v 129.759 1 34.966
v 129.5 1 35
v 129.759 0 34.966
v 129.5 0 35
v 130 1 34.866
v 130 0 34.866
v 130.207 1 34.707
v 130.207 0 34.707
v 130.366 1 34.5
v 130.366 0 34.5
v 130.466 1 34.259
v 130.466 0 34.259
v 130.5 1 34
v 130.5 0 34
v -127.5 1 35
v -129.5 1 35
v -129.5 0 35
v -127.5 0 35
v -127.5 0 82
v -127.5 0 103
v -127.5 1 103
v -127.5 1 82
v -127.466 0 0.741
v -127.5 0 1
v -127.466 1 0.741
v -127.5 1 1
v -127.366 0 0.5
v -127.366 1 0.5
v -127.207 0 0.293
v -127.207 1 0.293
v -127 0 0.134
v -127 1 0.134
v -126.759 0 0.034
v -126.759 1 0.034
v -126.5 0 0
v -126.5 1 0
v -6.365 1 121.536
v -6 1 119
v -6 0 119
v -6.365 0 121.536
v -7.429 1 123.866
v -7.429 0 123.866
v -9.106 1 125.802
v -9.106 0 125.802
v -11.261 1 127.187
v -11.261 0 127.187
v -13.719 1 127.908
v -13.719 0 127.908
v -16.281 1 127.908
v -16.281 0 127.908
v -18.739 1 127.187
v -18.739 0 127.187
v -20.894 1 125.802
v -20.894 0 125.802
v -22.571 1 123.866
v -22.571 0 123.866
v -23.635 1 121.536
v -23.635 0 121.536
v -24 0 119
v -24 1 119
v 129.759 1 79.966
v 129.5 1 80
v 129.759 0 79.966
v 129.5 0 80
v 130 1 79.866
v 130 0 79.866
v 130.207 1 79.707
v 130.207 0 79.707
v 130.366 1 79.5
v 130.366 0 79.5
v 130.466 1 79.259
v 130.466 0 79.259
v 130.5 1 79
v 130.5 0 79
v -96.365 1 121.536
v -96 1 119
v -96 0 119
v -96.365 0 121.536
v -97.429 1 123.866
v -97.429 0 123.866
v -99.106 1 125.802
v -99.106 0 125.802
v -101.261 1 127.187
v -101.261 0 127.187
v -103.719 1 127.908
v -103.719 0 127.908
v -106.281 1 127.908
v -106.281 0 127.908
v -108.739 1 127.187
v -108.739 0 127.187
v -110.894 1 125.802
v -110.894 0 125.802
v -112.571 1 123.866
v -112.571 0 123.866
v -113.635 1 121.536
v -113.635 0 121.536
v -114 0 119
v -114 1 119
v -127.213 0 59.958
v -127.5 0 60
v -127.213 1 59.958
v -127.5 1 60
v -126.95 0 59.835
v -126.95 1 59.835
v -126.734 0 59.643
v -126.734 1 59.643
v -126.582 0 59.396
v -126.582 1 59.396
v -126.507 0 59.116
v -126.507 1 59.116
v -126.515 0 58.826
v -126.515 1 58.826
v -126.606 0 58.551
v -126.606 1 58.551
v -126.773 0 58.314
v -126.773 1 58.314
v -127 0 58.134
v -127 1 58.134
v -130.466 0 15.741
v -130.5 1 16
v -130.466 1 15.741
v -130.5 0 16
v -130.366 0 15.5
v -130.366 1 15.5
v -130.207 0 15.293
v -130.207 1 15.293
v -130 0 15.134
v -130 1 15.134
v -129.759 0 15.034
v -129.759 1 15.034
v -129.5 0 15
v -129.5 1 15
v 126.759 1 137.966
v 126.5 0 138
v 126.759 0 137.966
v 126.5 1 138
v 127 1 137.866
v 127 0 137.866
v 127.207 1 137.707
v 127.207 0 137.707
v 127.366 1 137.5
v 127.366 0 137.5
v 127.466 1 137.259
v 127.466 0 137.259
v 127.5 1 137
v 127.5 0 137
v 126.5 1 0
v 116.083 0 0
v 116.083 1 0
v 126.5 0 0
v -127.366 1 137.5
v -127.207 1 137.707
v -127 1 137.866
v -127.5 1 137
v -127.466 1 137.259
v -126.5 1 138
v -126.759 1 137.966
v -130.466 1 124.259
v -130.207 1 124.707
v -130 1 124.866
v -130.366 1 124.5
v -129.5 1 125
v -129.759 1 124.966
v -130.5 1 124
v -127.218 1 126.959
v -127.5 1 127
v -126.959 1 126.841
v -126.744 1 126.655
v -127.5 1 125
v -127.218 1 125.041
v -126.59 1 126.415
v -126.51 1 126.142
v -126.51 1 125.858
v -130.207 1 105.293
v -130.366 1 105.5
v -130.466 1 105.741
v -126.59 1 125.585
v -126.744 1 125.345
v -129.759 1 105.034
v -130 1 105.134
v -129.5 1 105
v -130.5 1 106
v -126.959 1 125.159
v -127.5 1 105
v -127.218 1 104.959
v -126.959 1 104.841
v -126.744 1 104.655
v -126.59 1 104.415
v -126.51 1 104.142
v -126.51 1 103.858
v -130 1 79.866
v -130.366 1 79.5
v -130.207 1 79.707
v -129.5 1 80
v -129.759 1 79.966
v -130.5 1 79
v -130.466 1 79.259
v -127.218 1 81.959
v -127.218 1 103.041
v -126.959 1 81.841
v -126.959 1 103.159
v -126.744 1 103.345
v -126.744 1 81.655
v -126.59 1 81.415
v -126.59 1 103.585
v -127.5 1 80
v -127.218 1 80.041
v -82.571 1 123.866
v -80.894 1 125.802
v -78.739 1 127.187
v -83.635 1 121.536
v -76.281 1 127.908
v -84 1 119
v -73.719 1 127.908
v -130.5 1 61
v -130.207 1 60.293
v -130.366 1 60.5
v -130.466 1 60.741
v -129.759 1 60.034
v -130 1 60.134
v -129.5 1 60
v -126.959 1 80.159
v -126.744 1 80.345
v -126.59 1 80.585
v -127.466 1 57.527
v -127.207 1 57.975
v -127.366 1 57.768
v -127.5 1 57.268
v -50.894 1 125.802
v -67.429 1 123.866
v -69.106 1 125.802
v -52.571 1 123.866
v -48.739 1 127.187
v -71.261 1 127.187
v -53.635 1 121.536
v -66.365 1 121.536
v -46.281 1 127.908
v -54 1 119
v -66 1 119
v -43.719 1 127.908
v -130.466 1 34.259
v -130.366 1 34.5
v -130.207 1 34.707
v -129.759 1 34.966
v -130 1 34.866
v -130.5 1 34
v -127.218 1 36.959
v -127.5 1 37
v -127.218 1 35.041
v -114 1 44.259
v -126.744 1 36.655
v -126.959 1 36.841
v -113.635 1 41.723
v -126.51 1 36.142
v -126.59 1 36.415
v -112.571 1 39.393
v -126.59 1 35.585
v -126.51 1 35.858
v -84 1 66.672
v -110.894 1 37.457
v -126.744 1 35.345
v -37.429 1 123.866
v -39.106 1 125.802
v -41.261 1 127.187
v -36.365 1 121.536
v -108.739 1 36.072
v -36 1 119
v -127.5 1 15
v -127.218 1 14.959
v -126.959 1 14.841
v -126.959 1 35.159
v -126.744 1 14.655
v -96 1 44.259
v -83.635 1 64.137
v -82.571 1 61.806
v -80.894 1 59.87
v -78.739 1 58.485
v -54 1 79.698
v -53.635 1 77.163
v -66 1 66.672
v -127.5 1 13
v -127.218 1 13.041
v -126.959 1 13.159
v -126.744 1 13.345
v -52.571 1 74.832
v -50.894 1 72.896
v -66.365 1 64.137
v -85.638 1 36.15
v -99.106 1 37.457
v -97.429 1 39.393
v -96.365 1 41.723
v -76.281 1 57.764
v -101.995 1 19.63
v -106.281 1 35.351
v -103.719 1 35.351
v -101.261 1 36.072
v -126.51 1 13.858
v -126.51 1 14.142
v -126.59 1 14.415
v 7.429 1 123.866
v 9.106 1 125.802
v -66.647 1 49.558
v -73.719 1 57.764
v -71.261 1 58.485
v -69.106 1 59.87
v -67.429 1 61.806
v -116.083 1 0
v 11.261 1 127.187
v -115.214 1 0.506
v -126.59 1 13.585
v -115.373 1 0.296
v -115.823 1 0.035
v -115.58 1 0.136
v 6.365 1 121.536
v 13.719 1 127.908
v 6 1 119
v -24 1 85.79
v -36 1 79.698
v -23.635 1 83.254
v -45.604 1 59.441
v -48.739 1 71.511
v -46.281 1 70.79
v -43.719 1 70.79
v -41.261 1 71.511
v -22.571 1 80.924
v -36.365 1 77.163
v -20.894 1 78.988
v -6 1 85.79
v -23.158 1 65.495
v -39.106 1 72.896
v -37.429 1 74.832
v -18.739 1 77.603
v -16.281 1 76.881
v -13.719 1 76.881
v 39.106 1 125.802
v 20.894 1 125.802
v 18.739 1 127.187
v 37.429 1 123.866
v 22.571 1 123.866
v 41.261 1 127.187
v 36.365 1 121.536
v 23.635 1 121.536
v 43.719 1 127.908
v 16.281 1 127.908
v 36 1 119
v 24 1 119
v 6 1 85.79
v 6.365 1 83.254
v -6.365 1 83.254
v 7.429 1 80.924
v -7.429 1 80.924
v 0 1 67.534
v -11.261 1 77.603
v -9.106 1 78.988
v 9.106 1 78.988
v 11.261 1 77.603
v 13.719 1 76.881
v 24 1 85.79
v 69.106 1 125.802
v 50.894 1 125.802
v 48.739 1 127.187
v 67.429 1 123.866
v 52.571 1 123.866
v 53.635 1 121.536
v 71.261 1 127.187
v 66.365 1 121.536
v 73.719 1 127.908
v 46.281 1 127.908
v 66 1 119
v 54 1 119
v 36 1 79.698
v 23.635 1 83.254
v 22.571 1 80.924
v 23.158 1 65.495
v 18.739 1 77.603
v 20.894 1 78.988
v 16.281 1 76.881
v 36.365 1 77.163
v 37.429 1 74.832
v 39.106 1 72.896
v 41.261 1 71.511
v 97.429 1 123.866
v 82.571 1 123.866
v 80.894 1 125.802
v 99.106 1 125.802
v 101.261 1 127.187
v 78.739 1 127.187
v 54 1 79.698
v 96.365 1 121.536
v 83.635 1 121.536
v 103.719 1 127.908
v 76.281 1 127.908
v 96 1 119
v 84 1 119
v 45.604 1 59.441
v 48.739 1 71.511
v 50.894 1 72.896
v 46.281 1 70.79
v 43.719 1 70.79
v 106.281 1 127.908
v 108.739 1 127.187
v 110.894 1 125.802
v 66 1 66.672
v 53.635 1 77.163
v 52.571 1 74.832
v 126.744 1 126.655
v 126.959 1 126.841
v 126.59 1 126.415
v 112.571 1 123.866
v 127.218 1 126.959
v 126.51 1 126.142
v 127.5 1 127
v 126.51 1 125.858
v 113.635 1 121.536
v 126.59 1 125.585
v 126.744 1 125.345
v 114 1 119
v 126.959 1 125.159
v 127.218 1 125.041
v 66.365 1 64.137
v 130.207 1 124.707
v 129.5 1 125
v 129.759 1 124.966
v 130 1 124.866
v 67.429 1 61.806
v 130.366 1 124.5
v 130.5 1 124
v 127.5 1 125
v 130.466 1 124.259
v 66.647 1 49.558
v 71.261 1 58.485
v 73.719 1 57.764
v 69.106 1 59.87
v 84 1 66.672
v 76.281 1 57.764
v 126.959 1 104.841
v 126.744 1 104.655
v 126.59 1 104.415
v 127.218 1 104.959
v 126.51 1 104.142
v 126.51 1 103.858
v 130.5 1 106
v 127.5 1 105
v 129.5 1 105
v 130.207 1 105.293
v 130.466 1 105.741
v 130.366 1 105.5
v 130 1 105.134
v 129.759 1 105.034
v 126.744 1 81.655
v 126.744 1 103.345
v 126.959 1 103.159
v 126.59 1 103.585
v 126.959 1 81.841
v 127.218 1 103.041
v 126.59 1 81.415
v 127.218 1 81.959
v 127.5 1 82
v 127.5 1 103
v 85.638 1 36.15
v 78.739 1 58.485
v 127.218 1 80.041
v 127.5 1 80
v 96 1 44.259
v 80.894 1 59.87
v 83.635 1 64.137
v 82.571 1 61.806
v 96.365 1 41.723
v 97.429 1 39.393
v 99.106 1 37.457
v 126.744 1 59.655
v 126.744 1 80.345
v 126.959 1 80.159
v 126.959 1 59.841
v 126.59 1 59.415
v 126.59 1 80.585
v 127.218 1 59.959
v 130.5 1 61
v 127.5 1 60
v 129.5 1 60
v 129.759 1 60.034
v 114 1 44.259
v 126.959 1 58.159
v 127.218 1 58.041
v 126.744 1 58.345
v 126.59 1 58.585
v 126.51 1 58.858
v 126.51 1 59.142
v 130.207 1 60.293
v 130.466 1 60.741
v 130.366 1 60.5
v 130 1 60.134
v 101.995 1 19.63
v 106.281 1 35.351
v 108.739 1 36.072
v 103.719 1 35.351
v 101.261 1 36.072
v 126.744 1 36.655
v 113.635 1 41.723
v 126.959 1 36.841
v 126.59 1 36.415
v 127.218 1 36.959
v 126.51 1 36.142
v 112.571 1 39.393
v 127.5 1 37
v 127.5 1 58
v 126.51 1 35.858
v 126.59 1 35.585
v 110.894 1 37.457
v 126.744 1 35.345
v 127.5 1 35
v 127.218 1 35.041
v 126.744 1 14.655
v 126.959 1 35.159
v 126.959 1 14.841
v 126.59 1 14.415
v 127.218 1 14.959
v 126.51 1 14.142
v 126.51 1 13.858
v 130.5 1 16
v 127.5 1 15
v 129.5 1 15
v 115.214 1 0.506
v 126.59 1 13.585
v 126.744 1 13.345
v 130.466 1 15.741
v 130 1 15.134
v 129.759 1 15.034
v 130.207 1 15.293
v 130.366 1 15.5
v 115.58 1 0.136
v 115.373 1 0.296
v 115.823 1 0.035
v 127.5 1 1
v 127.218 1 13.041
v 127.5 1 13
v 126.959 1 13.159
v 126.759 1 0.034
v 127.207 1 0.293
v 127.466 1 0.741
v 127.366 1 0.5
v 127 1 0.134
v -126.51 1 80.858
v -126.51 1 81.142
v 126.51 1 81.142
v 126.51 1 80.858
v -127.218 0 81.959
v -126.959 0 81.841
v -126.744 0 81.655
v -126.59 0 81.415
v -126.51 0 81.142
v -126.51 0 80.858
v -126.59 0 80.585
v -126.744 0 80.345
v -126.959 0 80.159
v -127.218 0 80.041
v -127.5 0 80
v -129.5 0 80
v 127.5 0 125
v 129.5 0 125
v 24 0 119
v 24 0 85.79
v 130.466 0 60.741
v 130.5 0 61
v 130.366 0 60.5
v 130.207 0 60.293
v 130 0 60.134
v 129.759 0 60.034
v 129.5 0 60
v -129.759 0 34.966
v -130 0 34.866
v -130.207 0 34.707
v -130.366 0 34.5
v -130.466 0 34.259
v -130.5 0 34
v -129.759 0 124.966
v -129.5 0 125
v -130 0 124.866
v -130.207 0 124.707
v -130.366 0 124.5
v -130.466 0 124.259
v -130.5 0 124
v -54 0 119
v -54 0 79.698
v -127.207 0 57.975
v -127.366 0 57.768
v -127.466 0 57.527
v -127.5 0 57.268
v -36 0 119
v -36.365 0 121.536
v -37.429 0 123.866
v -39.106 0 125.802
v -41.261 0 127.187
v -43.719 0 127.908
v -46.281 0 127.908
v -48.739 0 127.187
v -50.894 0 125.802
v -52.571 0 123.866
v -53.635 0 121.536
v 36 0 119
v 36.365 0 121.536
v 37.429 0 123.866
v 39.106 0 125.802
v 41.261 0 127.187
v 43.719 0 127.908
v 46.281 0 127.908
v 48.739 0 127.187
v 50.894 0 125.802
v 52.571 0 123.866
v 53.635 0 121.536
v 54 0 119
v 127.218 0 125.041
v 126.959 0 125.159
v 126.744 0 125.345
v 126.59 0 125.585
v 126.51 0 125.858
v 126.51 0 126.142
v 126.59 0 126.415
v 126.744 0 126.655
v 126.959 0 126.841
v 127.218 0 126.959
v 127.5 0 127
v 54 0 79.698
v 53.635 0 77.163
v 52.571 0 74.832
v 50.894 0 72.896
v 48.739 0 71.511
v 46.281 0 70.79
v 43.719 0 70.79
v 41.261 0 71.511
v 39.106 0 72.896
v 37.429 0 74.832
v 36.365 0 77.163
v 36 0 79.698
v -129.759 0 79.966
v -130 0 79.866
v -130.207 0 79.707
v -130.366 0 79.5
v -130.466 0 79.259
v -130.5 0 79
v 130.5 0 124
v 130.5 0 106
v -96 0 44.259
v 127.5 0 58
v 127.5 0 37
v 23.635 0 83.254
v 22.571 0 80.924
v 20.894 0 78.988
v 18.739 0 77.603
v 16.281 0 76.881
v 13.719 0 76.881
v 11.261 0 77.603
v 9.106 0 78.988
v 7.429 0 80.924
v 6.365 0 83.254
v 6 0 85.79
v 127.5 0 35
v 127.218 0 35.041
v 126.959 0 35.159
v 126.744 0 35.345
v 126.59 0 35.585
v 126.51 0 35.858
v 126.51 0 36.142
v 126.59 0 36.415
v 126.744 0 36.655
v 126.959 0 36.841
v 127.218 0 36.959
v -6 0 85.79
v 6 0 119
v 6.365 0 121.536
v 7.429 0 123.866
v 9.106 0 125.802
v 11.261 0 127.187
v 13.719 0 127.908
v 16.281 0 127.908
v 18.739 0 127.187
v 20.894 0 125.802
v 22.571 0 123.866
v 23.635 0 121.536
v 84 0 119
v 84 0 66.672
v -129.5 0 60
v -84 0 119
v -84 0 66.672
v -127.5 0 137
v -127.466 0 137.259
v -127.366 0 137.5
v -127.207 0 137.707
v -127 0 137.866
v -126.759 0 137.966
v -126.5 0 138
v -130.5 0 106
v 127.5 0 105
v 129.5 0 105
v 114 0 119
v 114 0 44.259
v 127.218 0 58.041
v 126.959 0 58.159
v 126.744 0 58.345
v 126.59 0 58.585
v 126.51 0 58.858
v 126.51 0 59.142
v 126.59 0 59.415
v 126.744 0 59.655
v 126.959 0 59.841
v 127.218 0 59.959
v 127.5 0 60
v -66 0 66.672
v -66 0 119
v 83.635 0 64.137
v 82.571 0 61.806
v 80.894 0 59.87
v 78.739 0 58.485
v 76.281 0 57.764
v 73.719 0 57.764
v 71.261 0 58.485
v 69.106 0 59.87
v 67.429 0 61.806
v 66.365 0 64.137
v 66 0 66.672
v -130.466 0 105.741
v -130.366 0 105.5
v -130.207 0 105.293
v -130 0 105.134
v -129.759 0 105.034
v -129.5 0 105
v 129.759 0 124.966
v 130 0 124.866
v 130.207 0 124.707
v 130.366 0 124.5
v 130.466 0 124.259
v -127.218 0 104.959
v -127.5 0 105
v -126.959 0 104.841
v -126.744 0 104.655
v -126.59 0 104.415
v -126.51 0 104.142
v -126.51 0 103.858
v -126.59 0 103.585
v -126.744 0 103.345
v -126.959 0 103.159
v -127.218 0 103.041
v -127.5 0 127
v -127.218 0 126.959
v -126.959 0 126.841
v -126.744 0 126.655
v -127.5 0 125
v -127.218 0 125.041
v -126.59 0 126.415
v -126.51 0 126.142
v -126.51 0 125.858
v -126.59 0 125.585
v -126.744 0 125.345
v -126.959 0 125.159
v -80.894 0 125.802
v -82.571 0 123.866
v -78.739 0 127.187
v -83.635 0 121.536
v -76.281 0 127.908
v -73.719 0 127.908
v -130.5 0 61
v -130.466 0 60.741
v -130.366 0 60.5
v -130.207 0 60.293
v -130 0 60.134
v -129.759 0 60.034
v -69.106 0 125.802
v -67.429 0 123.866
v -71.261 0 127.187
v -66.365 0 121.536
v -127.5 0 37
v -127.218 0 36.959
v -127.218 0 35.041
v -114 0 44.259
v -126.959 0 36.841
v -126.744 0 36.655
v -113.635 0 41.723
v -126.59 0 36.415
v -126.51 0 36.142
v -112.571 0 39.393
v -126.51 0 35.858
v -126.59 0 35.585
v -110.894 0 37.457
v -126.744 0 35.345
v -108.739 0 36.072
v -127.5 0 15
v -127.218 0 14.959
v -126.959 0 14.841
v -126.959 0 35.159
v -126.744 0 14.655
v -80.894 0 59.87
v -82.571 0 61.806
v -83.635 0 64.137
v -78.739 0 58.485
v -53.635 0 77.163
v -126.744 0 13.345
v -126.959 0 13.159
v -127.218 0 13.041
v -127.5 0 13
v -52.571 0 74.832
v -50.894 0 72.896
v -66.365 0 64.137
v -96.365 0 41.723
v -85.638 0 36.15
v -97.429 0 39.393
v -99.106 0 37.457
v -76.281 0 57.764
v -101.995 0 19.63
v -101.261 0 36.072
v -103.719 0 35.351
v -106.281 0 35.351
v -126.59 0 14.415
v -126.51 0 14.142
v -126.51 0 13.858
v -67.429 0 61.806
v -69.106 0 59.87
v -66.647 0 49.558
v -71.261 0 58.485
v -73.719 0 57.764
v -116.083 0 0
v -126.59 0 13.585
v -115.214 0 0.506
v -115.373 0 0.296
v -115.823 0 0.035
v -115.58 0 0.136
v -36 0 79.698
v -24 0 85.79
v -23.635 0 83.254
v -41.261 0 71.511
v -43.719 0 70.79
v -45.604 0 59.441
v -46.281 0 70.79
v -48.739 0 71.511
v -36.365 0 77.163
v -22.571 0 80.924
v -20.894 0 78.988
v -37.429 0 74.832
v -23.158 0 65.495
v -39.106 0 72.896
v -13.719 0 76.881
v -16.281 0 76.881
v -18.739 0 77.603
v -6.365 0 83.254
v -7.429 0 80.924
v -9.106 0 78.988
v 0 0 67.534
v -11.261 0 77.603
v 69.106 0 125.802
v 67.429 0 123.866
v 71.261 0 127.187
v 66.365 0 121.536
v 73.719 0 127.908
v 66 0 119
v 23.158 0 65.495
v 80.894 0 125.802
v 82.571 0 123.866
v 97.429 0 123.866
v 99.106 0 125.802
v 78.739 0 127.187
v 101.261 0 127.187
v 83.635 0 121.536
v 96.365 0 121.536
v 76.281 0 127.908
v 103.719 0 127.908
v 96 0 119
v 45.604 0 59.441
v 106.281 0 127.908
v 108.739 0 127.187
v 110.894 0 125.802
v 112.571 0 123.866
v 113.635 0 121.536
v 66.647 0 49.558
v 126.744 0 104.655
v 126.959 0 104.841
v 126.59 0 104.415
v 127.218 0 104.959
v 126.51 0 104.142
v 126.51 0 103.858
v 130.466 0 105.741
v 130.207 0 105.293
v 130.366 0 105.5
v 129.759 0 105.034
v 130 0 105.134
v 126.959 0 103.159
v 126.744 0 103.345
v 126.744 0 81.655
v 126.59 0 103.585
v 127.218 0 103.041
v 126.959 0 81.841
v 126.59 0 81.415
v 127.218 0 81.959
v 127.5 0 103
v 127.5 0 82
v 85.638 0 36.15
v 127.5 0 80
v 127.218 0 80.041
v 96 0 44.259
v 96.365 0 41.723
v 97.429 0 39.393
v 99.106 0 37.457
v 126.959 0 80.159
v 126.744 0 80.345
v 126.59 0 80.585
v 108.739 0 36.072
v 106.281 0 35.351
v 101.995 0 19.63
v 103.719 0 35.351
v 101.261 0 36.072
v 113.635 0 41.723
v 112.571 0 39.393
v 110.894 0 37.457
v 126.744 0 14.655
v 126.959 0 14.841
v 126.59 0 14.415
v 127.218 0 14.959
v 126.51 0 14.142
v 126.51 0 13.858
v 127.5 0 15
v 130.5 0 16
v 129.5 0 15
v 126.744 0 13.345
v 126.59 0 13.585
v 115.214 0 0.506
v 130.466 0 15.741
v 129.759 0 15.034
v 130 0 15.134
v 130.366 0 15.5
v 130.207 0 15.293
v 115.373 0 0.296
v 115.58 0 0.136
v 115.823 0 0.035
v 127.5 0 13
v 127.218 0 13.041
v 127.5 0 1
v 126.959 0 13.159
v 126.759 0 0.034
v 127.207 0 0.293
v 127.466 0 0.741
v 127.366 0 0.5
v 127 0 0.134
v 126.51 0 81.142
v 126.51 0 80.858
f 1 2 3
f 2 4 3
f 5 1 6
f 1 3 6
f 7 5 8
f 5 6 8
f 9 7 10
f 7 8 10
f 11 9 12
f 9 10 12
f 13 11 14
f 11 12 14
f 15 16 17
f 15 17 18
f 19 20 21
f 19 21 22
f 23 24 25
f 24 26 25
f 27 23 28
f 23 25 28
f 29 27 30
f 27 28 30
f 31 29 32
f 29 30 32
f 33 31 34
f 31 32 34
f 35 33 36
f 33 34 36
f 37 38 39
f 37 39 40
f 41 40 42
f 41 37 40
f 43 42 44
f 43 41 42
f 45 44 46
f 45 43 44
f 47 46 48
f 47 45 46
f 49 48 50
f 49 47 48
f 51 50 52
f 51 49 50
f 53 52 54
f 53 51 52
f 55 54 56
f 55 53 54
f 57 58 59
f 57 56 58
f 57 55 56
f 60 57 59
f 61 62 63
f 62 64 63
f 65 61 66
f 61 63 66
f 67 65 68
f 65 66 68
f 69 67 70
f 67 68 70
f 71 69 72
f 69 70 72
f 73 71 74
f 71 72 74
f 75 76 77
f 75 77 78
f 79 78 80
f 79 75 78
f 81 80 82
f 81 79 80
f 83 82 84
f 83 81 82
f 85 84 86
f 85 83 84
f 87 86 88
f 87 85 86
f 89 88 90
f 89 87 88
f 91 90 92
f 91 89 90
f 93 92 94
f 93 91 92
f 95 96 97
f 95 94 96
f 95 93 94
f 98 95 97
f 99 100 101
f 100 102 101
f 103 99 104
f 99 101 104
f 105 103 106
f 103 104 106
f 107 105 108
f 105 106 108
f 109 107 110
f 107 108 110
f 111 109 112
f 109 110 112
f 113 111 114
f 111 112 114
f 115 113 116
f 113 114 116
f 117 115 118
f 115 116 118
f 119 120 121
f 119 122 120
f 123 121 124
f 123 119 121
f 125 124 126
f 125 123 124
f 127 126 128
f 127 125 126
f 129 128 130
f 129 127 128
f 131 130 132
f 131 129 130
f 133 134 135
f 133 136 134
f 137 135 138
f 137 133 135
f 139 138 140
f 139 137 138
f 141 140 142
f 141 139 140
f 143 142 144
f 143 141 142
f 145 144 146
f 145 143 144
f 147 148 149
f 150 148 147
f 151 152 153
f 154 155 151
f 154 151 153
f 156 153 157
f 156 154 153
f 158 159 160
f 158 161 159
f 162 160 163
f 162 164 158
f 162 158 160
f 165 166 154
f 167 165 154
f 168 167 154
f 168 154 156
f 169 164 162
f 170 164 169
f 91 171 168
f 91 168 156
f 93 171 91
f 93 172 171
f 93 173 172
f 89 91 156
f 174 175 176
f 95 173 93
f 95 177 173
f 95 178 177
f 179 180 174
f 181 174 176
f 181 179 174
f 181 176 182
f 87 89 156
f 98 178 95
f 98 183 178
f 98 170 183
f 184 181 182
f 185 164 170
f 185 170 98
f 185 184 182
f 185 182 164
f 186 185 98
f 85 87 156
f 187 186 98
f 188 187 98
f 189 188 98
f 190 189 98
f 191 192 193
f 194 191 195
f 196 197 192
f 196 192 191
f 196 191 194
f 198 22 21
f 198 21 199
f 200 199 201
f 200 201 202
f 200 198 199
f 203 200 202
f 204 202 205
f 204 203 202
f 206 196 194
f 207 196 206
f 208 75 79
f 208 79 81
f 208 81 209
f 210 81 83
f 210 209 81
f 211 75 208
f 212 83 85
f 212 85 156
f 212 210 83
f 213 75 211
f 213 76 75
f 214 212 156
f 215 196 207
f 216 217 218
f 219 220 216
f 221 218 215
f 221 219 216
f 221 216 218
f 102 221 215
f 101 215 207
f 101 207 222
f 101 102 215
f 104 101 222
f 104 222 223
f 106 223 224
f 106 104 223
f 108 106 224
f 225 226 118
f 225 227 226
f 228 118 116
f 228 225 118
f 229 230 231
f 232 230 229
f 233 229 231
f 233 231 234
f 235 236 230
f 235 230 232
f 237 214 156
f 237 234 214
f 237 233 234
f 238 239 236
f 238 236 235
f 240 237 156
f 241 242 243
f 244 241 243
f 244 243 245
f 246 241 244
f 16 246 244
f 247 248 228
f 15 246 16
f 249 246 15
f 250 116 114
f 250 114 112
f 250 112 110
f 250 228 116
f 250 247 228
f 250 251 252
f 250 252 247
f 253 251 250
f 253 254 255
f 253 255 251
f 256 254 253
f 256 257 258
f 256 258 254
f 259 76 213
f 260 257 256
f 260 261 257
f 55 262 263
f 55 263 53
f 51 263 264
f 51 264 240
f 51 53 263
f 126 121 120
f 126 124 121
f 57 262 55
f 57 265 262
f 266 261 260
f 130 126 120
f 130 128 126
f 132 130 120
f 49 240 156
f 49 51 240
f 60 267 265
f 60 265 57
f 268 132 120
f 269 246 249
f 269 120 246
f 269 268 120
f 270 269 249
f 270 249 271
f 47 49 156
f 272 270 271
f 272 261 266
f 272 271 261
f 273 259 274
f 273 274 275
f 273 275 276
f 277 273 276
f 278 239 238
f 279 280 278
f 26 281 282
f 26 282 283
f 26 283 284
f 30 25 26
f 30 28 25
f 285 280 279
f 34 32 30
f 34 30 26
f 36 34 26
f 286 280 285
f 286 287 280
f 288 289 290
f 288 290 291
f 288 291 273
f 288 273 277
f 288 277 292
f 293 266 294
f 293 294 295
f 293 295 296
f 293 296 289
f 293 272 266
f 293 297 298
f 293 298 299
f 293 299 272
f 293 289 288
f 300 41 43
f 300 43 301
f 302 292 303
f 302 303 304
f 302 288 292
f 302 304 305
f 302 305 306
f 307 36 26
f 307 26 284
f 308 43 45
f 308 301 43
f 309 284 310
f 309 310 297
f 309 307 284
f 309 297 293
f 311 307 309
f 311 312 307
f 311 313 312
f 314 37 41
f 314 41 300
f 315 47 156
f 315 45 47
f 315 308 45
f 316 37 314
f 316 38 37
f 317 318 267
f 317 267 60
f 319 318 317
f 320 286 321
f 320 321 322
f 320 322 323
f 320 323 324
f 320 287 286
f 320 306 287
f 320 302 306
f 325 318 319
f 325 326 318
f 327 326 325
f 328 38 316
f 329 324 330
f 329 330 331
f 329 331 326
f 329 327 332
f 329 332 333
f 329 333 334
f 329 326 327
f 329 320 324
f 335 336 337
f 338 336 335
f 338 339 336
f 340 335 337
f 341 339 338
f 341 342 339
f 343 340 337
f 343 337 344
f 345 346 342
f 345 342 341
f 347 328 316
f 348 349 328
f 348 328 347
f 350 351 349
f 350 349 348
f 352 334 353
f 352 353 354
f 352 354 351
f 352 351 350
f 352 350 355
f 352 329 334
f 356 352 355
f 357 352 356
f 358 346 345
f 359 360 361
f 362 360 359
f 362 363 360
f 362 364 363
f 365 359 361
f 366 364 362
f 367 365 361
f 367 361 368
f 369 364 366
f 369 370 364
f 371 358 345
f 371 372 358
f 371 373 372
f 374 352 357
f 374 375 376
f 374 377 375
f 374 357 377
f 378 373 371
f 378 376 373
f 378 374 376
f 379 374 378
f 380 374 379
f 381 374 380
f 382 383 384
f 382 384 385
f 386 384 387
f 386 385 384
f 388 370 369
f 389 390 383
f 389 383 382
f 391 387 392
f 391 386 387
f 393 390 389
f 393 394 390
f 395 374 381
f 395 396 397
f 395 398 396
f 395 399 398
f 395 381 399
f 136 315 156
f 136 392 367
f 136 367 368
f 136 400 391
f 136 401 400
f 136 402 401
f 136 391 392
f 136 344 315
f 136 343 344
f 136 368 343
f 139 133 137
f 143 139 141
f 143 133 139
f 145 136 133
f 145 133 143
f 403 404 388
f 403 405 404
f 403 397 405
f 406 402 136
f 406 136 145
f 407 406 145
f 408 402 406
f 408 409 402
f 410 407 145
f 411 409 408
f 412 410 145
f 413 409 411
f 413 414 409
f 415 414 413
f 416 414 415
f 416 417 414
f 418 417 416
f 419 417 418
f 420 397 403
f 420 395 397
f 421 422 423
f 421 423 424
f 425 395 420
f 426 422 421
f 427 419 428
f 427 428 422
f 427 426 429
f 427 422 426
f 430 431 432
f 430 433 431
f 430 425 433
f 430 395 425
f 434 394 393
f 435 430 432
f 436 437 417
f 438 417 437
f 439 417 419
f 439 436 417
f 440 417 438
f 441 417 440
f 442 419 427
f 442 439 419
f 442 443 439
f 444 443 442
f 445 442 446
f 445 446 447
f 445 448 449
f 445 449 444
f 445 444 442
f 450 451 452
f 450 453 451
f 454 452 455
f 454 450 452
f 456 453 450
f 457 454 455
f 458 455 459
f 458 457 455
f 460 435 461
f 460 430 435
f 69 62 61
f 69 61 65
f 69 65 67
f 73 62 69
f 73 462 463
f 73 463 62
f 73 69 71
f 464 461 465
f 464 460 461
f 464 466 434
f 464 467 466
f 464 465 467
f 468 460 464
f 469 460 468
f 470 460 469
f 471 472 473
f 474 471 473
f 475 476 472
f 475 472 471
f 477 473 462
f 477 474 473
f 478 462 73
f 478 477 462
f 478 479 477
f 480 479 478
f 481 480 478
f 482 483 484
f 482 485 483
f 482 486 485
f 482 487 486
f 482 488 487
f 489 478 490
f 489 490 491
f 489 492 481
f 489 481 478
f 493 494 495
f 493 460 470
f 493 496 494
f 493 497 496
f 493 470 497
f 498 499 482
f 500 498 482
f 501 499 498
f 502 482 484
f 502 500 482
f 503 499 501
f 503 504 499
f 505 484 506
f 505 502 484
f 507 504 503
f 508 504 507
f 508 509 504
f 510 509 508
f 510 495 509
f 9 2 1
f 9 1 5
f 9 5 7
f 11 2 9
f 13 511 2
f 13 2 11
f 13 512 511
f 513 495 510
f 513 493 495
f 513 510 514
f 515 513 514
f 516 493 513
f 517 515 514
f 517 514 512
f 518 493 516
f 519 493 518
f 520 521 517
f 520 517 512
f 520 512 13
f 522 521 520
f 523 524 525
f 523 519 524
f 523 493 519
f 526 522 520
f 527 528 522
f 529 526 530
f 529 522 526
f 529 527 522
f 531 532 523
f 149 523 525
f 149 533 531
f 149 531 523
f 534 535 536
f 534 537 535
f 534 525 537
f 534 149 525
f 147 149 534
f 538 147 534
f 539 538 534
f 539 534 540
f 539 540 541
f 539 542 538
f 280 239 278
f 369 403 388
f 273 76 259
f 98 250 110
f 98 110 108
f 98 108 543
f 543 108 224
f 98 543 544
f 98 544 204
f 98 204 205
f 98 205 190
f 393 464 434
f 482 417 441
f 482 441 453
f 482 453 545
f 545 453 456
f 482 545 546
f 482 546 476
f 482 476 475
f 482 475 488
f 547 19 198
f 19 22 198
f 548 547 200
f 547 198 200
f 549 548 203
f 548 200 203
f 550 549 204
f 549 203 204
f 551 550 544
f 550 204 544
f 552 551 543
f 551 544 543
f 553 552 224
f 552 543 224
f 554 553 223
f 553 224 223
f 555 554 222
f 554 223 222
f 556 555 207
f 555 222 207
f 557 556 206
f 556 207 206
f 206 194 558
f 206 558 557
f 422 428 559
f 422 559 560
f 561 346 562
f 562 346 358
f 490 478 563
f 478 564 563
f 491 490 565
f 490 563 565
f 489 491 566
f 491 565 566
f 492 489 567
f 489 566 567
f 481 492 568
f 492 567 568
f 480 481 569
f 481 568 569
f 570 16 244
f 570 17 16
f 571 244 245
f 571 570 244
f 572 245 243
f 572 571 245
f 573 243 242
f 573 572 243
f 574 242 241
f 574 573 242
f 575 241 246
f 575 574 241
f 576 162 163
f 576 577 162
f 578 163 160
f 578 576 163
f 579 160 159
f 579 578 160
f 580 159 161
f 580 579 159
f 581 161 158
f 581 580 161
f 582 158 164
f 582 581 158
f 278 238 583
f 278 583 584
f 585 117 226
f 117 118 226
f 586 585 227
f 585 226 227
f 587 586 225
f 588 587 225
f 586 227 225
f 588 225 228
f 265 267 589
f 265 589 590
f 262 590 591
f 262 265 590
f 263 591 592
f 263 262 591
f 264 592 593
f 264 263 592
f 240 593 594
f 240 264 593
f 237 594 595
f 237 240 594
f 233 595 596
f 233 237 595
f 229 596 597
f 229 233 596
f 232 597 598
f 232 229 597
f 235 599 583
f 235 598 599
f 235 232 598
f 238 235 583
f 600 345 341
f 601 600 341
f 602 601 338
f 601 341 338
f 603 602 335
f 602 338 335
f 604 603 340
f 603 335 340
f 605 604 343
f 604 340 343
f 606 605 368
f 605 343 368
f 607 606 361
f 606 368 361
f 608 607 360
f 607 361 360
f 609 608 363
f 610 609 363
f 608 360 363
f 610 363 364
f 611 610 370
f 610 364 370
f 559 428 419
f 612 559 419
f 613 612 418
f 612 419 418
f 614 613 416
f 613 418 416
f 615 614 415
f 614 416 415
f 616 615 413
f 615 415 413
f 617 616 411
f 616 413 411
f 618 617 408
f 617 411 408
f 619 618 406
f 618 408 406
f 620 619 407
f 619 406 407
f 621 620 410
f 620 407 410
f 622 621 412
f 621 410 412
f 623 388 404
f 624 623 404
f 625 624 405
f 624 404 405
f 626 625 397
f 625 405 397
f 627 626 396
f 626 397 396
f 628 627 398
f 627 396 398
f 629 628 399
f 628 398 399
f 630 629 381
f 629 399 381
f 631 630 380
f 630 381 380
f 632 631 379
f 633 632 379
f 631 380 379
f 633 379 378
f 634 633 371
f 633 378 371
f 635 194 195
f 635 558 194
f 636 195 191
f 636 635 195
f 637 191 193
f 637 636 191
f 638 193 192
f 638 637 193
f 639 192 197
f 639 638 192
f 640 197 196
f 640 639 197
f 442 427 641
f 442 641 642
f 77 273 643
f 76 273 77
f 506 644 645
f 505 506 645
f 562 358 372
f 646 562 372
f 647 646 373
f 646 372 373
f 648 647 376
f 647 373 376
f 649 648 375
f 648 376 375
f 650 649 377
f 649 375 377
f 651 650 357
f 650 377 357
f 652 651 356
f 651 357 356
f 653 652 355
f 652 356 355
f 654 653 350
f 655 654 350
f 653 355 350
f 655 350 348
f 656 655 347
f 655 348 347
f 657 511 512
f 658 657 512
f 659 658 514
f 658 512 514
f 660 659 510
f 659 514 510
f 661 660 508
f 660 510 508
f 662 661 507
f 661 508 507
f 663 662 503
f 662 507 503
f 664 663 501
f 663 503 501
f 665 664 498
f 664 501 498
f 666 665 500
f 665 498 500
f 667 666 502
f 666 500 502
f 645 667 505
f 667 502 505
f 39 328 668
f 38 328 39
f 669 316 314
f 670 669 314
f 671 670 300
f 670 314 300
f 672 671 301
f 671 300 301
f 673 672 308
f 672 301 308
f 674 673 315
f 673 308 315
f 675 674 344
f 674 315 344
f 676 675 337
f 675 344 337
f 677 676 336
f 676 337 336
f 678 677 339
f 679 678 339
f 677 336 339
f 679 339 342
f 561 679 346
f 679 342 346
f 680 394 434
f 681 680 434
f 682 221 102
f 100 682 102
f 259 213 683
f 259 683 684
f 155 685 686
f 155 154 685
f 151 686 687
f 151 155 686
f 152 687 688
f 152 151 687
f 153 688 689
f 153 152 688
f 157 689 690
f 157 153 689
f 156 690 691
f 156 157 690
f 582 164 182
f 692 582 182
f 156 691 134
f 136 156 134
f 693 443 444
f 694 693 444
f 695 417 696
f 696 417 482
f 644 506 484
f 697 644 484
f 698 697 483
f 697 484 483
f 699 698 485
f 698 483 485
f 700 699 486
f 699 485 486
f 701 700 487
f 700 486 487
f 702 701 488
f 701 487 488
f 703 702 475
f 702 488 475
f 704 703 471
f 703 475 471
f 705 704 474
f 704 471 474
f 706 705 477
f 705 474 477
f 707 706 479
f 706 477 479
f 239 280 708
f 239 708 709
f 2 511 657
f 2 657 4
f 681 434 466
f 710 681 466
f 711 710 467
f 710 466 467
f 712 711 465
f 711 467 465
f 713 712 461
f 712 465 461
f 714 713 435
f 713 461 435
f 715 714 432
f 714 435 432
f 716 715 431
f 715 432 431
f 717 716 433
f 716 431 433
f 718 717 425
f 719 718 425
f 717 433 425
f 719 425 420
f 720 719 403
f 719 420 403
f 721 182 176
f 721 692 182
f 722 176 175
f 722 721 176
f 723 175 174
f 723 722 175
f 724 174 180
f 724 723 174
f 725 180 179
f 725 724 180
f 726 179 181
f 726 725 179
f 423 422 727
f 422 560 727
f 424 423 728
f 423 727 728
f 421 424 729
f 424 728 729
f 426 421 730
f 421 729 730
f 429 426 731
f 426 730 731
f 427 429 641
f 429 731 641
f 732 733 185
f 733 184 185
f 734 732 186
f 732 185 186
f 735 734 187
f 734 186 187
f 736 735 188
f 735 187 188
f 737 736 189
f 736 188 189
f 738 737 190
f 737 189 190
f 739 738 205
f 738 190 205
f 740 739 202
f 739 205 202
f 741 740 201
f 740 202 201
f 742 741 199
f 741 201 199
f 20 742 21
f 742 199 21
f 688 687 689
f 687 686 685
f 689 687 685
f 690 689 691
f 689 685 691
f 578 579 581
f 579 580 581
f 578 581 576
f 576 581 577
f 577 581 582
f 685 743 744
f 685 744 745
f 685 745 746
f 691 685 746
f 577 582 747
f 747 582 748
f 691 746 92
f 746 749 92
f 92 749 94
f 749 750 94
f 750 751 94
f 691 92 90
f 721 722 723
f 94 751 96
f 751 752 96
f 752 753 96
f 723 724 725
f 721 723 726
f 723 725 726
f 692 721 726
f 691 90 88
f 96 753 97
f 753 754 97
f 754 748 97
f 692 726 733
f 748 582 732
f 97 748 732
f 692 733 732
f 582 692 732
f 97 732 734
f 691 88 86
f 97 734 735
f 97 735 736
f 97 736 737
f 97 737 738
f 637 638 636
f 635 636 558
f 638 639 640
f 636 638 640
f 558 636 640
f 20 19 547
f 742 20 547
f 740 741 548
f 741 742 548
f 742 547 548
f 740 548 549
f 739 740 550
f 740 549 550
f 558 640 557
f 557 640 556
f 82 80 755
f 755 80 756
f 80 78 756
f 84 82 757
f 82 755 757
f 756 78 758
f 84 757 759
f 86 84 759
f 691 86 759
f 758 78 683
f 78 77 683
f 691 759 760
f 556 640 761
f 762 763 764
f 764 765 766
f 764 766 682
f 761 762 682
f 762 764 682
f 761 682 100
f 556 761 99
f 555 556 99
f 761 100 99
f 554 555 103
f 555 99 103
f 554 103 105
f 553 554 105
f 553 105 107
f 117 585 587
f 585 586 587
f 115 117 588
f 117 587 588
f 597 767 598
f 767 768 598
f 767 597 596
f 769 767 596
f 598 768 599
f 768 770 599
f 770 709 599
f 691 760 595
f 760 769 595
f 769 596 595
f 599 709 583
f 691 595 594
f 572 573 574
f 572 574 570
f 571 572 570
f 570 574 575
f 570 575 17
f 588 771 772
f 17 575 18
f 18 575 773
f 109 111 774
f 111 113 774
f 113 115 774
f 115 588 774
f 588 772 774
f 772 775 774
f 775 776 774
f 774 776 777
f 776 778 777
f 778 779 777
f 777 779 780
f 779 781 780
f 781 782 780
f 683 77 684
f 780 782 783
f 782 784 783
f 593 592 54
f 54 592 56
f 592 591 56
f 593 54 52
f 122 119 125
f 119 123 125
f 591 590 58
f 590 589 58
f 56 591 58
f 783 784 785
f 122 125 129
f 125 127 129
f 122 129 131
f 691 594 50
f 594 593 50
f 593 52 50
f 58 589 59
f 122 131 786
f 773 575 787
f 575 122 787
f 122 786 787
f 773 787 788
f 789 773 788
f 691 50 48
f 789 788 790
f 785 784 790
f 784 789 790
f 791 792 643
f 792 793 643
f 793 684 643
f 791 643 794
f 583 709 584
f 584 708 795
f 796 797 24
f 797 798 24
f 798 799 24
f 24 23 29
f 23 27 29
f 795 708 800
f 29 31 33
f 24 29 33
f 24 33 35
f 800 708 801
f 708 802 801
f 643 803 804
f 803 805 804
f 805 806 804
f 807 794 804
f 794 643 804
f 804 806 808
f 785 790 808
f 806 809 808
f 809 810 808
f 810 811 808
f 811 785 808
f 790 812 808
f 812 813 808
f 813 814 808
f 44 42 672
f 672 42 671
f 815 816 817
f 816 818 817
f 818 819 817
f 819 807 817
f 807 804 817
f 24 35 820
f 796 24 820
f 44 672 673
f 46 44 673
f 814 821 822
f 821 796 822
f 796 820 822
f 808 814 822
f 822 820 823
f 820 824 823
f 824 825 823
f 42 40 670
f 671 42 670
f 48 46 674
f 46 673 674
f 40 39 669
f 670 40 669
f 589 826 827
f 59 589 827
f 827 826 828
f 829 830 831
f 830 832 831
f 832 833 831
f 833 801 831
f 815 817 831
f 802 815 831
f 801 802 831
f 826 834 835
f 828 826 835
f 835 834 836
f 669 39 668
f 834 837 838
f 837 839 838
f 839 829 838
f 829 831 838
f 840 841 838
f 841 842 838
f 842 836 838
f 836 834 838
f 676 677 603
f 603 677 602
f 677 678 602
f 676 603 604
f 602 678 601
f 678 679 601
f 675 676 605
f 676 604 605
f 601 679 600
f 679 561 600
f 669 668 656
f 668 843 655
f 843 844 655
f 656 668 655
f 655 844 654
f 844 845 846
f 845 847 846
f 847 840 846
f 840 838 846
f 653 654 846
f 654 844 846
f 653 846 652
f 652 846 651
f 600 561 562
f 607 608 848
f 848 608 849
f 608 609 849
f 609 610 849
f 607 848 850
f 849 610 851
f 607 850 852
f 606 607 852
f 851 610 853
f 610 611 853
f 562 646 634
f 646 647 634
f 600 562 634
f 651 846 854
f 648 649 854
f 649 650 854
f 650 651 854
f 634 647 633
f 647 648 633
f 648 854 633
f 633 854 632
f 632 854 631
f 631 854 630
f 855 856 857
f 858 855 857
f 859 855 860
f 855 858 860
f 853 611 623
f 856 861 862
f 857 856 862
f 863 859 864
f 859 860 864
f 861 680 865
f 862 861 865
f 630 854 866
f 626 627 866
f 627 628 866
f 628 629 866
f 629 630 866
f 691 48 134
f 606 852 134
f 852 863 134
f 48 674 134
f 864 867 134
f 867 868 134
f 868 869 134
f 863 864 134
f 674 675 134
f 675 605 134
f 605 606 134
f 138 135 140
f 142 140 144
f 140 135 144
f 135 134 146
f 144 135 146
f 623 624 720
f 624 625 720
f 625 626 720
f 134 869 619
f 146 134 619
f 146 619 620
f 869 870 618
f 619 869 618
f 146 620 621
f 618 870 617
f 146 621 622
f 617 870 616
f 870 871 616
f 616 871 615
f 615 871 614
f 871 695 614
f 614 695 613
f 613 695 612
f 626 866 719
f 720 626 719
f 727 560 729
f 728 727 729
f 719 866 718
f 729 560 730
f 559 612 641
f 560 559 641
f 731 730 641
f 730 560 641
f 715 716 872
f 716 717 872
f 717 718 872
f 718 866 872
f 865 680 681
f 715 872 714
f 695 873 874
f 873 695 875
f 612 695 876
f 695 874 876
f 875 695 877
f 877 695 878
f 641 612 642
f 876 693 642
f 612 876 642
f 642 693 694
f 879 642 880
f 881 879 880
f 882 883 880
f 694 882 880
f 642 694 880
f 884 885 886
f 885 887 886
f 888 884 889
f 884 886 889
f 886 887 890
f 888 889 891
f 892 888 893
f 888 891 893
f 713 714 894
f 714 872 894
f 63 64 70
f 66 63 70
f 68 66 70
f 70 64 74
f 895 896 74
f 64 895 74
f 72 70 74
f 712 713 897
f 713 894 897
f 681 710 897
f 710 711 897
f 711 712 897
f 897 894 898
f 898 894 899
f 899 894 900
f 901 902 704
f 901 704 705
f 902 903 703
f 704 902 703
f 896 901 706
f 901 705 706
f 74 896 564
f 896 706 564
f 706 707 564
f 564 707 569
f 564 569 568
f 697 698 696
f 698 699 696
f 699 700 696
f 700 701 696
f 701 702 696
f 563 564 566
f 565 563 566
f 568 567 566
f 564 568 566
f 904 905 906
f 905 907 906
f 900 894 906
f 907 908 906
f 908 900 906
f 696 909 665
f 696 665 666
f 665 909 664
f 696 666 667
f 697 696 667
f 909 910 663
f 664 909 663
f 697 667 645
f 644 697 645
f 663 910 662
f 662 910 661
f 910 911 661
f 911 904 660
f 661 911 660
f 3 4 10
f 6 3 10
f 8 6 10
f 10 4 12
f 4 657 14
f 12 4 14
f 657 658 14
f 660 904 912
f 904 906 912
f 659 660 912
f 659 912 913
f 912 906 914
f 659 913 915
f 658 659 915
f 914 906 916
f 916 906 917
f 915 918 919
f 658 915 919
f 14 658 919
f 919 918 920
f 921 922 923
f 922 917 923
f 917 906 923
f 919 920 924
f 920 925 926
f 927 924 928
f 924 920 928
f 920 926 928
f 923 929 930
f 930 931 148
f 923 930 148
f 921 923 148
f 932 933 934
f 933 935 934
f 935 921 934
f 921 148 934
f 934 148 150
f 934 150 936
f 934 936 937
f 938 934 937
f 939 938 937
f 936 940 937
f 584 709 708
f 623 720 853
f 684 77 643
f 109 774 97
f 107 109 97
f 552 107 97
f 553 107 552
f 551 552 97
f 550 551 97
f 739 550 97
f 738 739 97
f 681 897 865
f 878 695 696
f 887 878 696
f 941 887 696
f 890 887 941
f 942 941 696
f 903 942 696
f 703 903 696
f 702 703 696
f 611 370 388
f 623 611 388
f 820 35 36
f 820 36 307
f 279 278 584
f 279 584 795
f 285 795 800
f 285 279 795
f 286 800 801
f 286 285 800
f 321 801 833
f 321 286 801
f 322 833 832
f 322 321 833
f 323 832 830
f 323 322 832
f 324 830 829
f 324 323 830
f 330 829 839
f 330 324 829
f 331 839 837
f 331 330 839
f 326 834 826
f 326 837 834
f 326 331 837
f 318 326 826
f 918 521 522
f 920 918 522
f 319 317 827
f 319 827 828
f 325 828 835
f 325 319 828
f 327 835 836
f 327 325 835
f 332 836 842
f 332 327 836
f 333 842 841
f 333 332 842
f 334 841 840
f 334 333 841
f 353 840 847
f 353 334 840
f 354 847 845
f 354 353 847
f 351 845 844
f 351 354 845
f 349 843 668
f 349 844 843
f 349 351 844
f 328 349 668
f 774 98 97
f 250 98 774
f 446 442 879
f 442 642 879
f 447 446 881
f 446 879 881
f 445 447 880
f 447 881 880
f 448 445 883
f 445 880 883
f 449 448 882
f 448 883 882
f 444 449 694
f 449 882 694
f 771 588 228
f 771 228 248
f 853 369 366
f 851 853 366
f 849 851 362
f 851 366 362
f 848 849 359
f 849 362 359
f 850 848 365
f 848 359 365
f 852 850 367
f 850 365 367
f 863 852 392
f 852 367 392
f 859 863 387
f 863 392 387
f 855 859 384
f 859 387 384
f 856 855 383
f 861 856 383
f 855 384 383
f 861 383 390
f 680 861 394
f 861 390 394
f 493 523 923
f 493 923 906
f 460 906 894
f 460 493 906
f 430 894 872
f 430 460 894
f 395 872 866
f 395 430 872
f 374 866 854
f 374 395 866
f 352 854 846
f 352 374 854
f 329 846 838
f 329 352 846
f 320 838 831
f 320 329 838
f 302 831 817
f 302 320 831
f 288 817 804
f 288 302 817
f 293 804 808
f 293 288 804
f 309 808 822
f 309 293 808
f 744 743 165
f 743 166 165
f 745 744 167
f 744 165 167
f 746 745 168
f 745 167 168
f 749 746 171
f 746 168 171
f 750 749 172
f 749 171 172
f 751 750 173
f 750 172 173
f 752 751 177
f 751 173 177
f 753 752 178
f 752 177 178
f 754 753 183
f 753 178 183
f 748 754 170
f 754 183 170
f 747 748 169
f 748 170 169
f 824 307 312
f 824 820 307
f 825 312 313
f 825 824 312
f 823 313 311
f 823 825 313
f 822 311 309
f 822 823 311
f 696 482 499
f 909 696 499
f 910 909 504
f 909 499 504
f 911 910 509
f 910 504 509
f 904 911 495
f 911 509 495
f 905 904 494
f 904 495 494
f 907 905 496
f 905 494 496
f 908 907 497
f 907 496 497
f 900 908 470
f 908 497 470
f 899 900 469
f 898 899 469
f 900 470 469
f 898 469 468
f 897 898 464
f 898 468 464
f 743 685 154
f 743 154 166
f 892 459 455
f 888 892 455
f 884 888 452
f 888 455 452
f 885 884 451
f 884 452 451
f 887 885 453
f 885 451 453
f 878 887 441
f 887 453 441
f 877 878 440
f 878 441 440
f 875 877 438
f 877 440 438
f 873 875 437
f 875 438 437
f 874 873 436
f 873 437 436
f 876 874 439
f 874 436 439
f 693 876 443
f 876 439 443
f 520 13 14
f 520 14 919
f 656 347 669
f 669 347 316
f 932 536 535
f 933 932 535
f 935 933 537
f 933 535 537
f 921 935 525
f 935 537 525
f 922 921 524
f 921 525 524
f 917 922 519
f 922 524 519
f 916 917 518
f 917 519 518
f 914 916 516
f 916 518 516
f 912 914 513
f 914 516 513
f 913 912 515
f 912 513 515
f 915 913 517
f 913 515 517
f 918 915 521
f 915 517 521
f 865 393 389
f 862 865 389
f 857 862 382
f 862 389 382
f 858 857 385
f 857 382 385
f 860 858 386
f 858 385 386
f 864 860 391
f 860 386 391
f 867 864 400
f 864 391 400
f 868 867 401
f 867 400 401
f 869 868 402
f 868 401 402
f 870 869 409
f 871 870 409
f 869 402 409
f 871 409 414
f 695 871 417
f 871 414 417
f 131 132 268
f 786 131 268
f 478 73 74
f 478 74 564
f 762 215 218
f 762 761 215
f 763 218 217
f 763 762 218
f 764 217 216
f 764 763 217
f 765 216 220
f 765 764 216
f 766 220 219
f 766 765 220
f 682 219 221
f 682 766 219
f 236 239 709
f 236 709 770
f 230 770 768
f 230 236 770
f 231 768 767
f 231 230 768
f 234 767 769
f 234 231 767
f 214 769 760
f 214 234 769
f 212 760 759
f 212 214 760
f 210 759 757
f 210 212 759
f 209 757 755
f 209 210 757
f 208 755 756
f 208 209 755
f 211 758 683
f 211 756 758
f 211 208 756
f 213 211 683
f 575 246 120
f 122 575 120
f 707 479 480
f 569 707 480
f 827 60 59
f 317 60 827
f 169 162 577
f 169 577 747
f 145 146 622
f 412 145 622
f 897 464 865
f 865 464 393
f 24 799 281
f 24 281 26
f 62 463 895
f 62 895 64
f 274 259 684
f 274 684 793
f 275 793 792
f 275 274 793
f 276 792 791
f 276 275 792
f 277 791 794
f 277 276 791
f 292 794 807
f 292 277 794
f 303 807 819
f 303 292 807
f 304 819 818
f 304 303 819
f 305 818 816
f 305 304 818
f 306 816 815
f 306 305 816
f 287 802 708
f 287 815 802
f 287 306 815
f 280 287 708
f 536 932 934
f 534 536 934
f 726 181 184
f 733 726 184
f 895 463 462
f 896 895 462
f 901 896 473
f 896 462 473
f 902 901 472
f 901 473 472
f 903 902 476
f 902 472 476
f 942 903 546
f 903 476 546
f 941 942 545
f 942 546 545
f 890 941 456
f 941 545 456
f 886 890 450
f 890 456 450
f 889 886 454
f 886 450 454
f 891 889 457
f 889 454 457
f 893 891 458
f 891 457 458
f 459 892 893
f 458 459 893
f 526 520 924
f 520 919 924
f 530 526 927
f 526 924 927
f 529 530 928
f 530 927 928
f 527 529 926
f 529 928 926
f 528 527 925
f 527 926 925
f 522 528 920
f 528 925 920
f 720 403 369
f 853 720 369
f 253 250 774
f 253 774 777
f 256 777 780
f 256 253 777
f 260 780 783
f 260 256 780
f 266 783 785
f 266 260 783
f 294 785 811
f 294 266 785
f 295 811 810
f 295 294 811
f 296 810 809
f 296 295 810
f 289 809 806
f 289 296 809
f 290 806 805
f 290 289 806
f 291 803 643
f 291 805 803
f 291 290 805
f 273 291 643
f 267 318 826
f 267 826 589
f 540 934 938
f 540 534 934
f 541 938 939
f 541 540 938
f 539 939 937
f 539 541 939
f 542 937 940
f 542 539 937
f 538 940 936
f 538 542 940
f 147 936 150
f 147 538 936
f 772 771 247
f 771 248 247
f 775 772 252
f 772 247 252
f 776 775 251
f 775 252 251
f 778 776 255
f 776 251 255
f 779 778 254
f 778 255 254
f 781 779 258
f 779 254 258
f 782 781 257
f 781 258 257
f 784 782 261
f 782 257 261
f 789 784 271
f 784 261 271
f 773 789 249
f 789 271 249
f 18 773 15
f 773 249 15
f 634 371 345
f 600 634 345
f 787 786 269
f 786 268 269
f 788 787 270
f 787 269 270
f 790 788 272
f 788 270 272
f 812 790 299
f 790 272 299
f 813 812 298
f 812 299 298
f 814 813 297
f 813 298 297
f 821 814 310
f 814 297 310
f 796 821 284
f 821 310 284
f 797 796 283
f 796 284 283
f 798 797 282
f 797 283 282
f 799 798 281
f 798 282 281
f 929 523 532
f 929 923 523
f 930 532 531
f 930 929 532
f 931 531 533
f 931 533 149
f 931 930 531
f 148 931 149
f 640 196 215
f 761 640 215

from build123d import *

# Parameters (mm, degrees)
SKETCH_1_W          = 255
SKETCH_1_H          = 138
EXTRUDE_1_DEPTH     = 1
CUT_EXTRUDE_1_DEPTH = 188.88626879
SKETCH_5_W          = 3
SKETCH_5_H          = 20
EXTRUDE_3_DEPTH     = 1
SKETCH_6_R          = 1
CUT_EXTRUDE_3_DEPTH = 190.934857254
CUT_EXTRUDE_5_DEPTH = 190.934857254
FILLET_1_R          = 1


with BuildPart() as part:
    # 草图1 → 凸台-拉伸1 (new body)
    with BuildSketch(Plane(origin=(0, 0, 0), x_dir=(1, 0, 0), z_dir=(0, 1, 0))):
        with Locations((0, -69)):
            Rectangle(SKETCH_1_W, SKETCH_1_H)
    extrude(amount=EXTRUDE_1_DEPTH)

    # 草图2 → 切除-拉伸1 (cut, through all)
    with BuildSketch(Plane(origin=(0, 1, 0), x_dir=(1, 0, 0), z_dir=(0, 1, 0))):
        with BuildLine():
            Line((-115.5, 0), (115.5, 0))
            ThreePointArc((115.5, 0), (0, -67.533957913), (-115.5, 0))
        make_face()
    extrude(amount=-CUT_EXTRUDE_1_DEPTH, mode=Mode.SUBTRACT)

    # 草图5 → 凸台-拉伸3 (add)
    with BuildSketch(Plane(origin=(0, 1, 0), x_dir=(1, 0, 0), z_dir=(0, 1, 0))):
        with Locations((-129, -25)):
            Rectangle(SKETCH_5_W, SKETCH_5_H)
        with Locations((-129, -70)):
            Rectangle(SKETCH_5_W, SKETCH_5_H)
        with Locations((129, -25)):
            Rectangle(SKETCH_5_W, SKETCH_5_H)
        with Locations((-129, -115)):
            Rectangle(SKETCH_5_W, SKETCH_5_H)
        with Locations((129, -115)):
            Rectangle(SKETCH_5_W, SKETCH_5_H)
        with Locations((129, -70)):
            Rectangle(SKETCH_5_W, SKETCH_5_H)
    extrude(amount=-EXTRUDE_3_DEPTH)

    # 草图6 → 切除-拉伸3 (cut, through all)
    with BuildSketch(Plane(origin=(0, 1, 0), x_dir=(1, 0, 0), z_dir=(0, 1, 0))):
        with Locations((-127.5, -14)):
            Circle(SKETCH_6_R)
        with Locations((-127.5, -36)):
            Circle(SKETCH_6_R)
        with Locations((127.5, -36)):
            Circle(SKETCH_6_R)
        with Locations((127.5, -14)):
            Circle(SKETCH_6_R)
        with Locations((-127.5, -59)):
            Circle(SKETCH_6_R)
        with Locations((-127.5, -81)):
            Circle(SKETCH_6_R)
        with Locations((-127.5, -104)):
            Circle(SKETCH_6_R)
        with Locations((-127.5, -126)):
            Circle(SKETCH_6_R)
        with Locations((127.5, -126)):
            Circle(SKETCH_6_R)
        with Locations((127.5, -104)):
            Circle(SKETCH_6_R)
        with Locations((127.5, -81)):
            Circle(SKETCH_6_R)
        with Locations((127.5, -59)):
            Circle(SKETCH_6_R)
    extrude(amount=-CUT_EXTRUDE_3_DEPTH, mode=Mode.SUBTRACT)

    # 草图7 → 切除-拉伸5 (cut, through all)
    with BuildSketch(Plane(origin=(0, 1, 0), x_dir=(1, 0, 0), z_dir=(0, 1, 0))):
        with BuildLine():
            Line((-96, -44.259051802), (-96, -119))
            ThreePointArc((-96, -119), (-105, -128), (-114, -119))
            Line((-114, -119), (-114, -44.259051802))
            ThreePointArc((-114, -44.259051802), (-105, -35.259051802), (-96, -44.259051802))
        make_face()
        with BuildLine():
            Line((-66, -66.672094237), (-66, -119))
            ThreePointArc((-66, -119), (-75, -128), (-84, -119))
            Line((-84, -119), (-84, -66.672094237))
            ThreePointArc((-84, -66.672094237), (-75, -57.672094237), (-66, -66.672094237))
        make_face()
        with BuildLine():
            Line((-36, -79.698100888), (-36, -119))
            ThreePointArc((-36, -119), (-45, -128), (-54, -119))
            Line((-54, -119), (-54, -79.698100888))
            ThreePointArc((-54, -79.698100888), (-45, -70.698100888), (-36, -79.698100888))
        make_face()
        with BuildLine():
            Line((-6, -85.789722464), (-6, -119))
            ThreePointArc((-6, -119), (-15, -128), (-24, -119))
            Line((-24, -119), (-24, -85.789722464))
            ThreePointArc((-24, -85.789722464), (-15, -76.789722464), (-6, -85.789722464))
        make_face()
        with BuildLine():
            Line((6, -85.789722464), (6, -119))
            ThreePointArc((6, -119), (15, -128), (24, -119))
            Line((24, -119), (24, -85.789722464))
            ThreePointArc((24, -85.789722464), (15, -76.789722464), (6, -85.789722464))
        make_face()
        with BuildLine():
            Line((36, -79.698100888), (36, -119))
            ThreePointArc((36, -119), (45, -128), (54, -119))
            Line((54, -119), (54, -79.698100888))
            ThreePointArc((54, -79.698100888), (45, -70.698100888), (36, -79.698100888))
        make_face()
        with BuildLine():
            Line((66, -66.672094237), (66, -119))
            ThreePointArc((66, -119), (75, -128), (84, -119))
            Line((84, -119), (84, -66.672094237))
            ThreePointArc((84, -66.672094237), (75, -57.672094237), (66, -66.672094237))
        make_face()
        with BuildLine():
            Line((96, -44.259051802), (96, -119))
            ThreePointArc((96, -119), (105, -128), (114, -119))
            Line((114, -119), (114, -44.259051802))
            ThreePointArc((114, -44.259051802), (105, -35.259051802), (96, -44.259051802))
        make_face()
    extrude(amount=-CUT_EXTRUDE_5_DEPTH, mode=Mode.SUBTRACT)

    # 圆角1
    fillet_1_edges = [part.edges().sort_by_distance(p)[0] for p in [
        (-127.5, 0.5, 58),
        (115.5, 0.5, 0),
        (-115.5, 0.5, 0),
        (-130.5, 0.5, 35),
        (-130.5, 0.5, 15),
        (130.5, 0.5, 15),
        (130.5, 0.5, 35),
        (-130.5, 0.5, 80),
        (-130.5, 0.5, 60),
        (-130.5, 0.5, 125),
        (-130.5, 0.5, 105),
        (130.5, 0.5, 105),
        (130.5, 0.5, 125),
        (-127.5, 0.5, 0),
        (127.5, 0.5, 0),
        (127.5, 0.5, 138),
        (-127.5, 0.5, 138),
        (130.5, 0.5, 60),
        (130.5, 0.5, 80),
    ]]
    fillet(fillet_1_edges, radius=FILLET_1_R)


solid = part.part
